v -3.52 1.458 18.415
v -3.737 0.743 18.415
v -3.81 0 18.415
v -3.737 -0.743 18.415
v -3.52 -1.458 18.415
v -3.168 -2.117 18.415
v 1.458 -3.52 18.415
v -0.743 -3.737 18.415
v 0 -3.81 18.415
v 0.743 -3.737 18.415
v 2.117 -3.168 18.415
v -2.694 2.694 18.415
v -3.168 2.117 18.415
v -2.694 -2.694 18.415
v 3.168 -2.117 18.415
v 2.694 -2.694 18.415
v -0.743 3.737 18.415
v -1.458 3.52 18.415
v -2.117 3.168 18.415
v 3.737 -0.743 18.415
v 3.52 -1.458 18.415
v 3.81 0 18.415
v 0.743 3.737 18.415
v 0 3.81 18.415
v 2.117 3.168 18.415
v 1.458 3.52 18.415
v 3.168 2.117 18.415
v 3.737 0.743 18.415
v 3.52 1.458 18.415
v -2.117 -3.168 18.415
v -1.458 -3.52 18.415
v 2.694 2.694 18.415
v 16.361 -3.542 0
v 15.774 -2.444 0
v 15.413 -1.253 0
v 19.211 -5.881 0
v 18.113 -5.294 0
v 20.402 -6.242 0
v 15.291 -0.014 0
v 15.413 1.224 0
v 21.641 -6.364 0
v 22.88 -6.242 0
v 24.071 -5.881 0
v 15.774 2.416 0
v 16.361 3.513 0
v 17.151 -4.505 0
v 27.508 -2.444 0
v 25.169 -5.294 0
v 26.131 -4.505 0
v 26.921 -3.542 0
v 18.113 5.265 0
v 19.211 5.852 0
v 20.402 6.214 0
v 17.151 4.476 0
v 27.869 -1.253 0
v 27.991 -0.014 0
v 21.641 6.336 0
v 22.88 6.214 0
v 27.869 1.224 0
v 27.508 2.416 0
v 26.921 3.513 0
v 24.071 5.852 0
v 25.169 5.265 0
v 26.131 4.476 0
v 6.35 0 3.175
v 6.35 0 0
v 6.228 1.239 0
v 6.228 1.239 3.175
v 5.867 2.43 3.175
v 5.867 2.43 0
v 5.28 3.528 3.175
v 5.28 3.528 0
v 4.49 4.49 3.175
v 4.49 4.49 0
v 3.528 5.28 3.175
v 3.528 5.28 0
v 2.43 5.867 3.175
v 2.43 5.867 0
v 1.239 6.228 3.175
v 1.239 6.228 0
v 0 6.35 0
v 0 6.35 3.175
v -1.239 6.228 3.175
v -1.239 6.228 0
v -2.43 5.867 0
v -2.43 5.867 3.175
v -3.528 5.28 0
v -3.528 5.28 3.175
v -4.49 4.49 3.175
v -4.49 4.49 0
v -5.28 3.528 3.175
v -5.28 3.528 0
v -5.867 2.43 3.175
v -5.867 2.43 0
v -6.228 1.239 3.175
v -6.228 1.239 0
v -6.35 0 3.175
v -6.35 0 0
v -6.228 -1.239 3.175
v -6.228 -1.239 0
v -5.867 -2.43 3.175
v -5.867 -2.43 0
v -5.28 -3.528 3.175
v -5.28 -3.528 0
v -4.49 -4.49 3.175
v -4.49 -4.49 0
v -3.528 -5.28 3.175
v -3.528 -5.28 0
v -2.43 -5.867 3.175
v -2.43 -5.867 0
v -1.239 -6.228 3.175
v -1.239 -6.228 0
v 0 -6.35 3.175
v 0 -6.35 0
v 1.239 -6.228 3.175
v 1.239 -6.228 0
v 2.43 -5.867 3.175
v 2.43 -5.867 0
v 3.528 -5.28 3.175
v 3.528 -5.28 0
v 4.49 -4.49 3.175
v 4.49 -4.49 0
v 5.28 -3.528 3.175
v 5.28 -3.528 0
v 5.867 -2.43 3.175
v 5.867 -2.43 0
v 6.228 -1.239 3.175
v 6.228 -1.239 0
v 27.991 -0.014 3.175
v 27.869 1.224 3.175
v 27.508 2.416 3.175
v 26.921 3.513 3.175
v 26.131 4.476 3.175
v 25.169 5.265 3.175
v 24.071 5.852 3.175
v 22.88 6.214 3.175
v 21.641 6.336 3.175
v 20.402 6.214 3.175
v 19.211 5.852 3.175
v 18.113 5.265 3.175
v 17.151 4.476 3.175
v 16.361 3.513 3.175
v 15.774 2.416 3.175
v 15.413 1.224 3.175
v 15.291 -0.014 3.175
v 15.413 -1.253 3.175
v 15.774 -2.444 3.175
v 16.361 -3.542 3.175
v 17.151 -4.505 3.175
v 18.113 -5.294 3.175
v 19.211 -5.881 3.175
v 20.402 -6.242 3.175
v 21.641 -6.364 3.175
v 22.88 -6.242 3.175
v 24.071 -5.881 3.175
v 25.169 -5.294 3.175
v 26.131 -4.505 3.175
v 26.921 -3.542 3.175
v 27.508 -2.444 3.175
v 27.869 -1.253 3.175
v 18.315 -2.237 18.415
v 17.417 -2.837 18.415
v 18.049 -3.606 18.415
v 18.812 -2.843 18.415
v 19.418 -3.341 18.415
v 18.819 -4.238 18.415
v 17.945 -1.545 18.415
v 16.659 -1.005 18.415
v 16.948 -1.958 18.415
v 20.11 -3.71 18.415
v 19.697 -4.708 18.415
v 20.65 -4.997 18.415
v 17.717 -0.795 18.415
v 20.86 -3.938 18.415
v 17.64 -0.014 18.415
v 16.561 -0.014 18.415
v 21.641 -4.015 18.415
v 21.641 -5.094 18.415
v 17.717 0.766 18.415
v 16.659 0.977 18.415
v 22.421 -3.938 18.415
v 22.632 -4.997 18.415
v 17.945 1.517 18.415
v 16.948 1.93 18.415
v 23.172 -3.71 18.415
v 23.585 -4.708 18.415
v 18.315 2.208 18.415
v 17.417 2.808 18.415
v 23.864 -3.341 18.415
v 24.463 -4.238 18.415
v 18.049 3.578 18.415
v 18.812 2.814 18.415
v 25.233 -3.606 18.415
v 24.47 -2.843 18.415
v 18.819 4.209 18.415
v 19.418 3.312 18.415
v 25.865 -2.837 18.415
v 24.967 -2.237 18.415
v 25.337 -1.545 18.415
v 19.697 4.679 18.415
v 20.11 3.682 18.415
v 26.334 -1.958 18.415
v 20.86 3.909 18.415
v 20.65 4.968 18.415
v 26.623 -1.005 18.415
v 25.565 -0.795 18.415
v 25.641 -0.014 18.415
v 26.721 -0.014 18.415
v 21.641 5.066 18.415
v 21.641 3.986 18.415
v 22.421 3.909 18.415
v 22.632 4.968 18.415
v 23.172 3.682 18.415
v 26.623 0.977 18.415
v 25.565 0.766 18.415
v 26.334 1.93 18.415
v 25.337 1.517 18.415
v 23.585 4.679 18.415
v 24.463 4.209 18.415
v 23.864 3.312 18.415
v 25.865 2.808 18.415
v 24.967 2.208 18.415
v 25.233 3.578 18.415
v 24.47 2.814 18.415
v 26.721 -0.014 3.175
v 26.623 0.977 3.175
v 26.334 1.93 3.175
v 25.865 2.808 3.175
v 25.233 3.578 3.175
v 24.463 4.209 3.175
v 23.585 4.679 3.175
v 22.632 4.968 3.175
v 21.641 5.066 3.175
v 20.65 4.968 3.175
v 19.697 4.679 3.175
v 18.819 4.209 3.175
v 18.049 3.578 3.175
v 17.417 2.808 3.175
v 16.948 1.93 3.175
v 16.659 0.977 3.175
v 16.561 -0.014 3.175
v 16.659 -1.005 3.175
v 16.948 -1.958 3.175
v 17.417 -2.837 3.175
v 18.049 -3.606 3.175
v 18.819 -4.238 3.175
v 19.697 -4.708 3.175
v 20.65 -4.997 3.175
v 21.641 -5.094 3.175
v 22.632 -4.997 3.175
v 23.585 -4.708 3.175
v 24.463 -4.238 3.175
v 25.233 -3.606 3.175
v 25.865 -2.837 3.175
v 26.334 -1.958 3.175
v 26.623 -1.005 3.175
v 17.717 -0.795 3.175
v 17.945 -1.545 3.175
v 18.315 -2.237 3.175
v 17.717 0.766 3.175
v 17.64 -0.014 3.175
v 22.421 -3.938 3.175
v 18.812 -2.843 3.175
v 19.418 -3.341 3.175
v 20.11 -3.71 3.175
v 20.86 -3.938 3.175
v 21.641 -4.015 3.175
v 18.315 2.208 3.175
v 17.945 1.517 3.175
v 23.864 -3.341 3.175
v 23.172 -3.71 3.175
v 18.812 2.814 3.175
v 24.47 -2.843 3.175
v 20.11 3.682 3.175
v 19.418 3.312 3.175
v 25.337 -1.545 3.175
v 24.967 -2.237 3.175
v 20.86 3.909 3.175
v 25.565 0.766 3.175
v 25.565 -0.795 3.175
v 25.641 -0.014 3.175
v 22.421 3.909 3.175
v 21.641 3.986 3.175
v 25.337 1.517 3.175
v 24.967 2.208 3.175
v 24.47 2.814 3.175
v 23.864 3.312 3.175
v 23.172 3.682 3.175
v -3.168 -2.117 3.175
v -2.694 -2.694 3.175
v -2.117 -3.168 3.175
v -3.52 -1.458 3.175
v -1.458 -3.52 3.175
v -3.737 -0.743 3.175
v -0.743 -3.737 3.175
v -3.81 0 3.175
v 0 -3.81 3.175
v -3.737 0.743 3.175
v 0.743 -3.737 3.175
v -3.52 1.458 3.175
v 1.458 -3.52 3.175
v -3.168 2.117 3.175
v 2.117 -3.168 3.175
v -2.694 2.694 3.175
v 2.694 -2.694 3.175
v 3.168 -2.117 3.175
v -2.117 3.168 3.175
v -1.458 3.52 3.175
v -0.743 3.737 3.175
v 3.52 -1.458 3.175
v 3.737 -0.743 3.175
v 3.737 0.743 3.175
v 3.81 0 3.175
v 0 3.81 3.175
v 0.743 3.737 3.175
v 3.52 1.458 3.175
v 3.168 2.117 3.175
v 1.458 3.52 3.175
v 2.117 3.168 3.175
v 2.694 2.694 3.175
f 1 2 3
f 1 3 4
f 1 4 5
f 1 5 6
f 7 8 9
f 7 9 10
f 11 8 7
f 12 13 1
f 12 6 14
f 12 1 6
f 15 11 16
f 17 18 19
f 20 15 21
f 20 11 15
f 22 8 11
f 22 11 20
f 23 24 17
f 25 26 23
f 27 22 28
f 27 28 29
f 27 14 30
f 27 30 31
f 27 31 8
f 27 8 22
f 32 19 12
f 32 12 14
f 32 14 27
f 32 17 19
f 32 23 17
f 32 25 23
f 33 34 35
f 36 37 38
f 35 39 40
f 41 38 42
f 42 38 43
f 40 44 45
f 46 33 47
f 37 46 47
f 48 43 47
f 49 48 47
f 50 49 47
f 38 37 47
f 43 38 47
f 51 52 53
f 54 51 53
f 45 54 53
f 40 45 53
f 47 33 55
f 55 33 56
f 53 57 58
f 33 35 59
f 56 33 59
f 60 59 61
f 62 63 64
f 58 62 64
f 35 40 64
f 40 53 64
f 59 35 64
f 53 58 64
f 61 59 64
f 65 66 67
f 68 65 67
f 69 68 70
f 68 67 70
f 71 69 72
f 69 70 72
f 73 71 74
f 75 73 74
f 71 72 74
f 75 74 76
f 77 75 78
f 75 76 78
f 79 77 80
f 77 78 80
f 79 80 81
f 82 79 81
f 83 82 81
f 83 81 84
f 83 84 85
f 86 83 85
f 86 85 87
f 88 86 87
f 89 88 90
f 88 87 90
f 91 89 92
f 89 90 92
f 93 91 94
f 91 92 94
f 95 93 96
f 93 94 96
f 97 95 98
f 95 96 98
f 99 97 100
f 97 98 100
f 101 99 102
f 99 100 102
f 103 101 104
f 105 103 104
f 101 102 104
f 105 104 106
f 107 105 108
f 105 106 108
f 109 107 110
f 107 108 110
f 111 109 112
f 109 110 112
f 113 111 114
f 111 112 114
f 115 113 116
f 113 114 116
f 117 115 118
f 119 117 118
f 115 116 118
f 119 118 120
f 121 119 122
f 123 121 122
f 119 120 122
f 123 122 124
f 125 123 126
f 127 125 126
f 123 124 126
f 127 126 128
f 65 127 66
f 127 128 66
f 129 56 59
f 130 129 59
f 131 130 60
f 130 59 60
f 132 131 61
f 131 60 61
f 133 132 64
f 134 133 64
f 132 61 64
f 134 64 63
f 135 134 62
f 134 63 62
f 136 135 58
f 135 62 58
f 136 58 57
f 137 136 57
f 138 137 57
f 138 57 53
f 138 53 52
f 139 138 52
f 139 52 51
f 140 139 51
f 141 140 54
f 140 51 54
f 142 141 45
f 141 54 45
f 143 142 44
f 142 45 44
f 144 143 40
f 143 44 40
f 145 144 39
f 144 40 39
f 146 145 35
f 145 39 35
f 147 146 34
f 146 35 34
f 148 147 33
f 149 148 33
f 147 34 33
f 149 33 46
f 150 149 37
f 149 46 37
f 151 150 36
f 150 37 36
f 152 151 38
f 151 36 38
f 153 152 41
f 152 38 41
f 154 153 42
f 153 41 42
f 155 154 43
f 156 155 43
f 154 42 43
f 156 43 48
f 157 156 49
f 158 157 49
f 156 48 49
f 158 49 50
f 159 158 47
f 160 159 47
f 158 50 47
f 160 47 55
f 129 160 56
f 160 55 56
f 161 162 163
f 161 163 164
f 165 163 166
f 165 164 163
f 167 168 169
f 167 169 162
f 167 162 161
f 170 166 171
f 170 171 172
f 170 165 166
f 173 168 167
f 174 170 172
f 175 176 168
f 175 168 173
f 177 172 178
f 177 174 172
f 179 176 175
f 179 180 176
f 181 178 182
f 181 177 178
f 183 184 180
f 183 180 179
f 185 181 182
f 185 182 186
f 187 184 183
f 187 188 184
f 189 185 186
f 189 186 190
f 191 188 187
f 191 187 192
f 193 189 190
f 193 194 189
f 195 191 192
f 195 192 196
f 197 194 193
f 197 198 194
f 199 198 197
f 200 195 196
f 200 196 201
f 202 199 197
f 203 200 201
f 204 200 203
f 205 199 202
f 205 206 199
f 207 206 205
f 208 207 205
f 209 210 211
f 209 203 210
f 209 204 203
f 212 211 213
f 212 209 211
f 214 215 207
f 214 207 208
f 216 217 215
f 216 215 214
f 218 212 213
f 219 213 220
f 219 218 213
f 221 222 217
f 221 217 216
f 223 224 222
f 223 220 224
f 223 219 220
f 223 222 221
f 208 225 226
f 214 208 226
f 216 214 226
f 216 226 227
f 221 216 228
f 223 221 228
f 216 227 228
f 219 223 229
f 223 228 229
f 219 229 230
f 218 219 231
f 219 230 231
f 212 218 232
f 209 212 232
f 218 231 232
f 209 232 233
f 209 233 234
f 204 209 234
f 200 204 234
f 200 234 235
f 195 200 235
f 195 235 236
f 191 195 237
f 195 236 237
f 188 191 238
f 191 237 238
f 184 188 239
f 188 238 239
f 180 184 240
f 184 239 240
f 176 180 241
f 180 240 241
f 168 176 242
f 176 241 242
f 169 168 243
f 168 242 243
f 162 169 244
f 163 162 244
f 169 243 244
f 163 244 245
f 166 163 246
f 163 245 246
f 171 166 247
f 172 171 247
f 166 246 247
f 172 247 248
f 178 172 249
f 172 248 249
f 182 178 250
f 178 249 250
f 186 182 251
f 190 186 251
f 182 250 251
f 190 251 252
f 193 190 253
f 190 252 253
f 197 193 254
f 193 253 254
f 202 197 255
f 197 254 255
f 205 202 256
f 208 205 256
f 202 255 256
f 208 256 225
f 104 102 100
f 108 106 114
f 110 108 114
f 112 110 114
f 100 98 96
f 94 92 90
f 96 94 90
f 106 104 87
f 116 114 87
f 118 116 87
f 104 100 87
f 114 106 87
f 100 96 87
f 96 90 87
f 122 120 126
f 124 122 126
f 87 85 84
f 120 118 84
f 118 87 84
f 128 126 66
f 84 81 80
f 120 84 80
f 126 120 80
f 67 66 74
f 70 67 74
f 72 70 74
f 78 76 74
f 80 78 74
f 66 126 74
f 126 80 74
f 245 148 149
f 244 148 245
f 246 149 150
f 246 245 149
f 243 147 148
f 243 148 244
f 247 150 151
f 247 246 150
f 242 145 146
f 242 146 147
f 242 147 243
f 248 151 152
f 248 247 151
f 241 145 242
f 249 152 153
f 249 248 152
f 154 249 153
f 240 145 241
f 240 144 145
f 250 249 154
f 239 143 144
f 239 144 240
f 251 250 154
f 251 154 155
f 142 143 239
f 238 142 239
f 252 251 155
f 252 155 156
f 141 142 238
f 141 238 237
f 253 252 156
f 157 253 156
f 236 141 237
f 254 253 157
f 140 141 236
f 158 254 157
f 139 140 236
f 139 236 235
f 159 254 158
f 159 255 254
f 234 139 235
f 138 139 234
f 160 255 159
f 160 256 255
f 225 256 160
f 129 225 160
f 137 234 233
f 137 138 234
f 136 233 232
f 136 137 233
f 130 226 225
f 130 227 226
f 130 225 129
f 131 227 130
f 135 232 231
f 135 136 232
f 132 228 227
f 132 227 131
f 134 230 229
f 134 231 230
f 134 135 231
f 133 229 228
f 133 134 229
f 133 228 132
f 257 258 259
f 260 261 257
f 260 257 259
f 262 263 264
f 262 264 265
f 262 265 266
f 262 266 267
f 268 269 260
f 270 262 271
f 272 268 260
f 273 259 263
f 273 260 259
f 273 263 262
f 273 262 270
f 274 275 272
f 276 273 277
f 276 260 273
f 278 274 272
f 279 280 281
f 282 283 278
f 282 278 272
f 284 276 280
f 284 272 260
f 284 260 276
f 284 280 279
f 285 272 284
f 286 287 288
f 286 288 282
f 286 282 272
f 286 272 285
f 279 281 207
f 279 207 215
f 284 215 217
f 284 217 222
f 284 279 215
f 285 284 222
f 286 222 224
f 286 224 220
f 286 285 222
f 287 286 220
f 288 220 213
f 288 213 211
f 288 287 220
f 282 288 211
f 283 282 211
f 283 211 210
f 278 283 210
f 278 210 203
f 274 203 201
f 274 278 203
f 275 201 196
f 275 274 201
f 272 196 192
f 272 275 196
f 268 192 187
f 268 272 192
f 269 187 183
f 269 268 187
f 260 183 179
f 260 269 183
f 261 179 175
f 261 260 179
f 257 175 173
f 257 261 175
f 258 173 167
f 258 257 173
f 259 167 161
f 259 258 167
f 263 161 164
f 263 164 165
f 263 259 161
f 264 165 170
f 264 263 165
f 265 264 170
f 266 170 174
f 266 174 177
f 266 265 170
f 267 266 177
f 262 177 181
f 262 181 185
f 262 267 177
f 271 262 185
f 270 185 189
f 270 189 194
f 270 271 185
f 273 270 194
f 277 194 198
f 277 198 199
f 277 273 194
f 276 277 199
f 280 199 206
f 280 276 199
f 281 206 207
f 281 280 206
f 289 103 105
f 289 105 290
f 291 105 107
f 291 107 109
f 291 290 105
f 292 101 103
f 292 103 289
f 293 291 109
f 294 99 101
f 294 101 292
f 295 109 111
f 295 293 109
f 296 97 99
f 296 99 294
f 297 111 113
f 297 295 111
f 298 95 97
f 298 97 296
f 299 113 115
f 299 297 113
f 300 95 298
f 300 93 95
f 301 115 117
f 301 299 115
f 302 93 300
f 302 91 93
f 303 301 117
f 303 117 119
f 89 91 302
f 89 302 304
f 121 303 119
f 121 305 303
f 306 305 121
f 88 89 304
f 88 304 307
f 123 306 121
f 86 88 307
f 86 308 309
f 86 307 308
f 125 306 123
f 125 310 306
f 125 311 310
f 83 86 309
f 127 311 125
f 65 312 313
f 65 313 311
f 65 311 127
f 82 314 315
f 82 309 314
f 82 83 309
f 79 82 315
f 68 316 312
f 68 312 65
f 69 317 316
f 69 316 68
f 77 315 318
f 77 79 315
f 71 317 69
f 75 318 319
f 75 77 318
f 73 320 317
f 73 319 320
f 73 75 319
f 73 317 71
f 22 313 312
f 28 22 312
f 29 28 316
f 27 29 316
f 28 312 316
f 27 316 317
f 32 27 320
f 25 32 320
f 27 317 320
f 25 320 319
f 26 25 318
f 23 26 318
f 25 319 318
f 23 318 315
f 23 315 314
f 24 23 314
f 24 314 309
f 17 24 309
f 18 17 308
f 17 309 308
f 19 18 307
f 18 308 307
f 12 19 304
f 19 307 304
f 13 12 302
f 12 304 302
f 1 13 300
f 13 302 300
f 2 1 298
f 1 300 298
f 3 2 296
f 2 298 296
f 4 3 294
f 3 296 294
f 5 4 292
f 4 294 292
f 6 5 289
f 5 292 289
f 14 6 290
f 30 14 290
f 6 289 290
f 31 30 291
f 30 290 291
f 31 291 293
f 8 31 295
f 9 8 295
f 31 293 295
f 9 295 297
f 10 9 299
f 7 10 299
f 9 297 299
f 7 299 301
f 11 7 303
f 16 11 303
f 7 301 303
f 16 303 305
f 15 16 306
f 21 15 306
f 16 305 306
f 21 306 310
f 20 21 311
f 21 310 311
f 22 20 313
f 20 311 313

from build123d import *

# Parameters (mm, degrees)
F0_R     = 6.35
F1_DEPTH = 3.175
F2_R     = 3.81
F3_DEPTH = 15.24
F4_R     = 6.35
F5_DEPTH = 3.175
F6_R     = 5.08
F6_R_2   = 4.0005
F7_DEPTH = 15.24


with BuildPart() as f1:
    # F0 (on Top) → F1 (new body)
    with BuildSketch(Plane.XY):
        Circle(F0_R)
    extrude(amount=F1_DEPTH)

    # F2 (on face) → F3 (join)
    with BuildSketch(Plane.XY.offset(3.175)):
        Circle(F2_R)
    extrude(amount=F3_DEPTH)


with BuildPart() as f5:
    # F4 (on Top) → F5 (new body)
    with BuildSketch(Plane.XY):
        with Locations((21.640942, -0.014384)):
            Circle(F4_R)
    extrude(amount=F5_DEPTH)

    # F6 (on face) → F7 (join)
    with BuildSketch(Plane.XY.offset(3.175)):
        with Locations((21.640942, -0.014384)):
            Circle(F6_R)
        with Locations((21.640942, -0.014384)):
            Circle(F6_R_2, mode=Mode.SUBTRACT)
    extrude(amount=F7_DEPTH)


solid = Compound([f1.part, f5.part])
